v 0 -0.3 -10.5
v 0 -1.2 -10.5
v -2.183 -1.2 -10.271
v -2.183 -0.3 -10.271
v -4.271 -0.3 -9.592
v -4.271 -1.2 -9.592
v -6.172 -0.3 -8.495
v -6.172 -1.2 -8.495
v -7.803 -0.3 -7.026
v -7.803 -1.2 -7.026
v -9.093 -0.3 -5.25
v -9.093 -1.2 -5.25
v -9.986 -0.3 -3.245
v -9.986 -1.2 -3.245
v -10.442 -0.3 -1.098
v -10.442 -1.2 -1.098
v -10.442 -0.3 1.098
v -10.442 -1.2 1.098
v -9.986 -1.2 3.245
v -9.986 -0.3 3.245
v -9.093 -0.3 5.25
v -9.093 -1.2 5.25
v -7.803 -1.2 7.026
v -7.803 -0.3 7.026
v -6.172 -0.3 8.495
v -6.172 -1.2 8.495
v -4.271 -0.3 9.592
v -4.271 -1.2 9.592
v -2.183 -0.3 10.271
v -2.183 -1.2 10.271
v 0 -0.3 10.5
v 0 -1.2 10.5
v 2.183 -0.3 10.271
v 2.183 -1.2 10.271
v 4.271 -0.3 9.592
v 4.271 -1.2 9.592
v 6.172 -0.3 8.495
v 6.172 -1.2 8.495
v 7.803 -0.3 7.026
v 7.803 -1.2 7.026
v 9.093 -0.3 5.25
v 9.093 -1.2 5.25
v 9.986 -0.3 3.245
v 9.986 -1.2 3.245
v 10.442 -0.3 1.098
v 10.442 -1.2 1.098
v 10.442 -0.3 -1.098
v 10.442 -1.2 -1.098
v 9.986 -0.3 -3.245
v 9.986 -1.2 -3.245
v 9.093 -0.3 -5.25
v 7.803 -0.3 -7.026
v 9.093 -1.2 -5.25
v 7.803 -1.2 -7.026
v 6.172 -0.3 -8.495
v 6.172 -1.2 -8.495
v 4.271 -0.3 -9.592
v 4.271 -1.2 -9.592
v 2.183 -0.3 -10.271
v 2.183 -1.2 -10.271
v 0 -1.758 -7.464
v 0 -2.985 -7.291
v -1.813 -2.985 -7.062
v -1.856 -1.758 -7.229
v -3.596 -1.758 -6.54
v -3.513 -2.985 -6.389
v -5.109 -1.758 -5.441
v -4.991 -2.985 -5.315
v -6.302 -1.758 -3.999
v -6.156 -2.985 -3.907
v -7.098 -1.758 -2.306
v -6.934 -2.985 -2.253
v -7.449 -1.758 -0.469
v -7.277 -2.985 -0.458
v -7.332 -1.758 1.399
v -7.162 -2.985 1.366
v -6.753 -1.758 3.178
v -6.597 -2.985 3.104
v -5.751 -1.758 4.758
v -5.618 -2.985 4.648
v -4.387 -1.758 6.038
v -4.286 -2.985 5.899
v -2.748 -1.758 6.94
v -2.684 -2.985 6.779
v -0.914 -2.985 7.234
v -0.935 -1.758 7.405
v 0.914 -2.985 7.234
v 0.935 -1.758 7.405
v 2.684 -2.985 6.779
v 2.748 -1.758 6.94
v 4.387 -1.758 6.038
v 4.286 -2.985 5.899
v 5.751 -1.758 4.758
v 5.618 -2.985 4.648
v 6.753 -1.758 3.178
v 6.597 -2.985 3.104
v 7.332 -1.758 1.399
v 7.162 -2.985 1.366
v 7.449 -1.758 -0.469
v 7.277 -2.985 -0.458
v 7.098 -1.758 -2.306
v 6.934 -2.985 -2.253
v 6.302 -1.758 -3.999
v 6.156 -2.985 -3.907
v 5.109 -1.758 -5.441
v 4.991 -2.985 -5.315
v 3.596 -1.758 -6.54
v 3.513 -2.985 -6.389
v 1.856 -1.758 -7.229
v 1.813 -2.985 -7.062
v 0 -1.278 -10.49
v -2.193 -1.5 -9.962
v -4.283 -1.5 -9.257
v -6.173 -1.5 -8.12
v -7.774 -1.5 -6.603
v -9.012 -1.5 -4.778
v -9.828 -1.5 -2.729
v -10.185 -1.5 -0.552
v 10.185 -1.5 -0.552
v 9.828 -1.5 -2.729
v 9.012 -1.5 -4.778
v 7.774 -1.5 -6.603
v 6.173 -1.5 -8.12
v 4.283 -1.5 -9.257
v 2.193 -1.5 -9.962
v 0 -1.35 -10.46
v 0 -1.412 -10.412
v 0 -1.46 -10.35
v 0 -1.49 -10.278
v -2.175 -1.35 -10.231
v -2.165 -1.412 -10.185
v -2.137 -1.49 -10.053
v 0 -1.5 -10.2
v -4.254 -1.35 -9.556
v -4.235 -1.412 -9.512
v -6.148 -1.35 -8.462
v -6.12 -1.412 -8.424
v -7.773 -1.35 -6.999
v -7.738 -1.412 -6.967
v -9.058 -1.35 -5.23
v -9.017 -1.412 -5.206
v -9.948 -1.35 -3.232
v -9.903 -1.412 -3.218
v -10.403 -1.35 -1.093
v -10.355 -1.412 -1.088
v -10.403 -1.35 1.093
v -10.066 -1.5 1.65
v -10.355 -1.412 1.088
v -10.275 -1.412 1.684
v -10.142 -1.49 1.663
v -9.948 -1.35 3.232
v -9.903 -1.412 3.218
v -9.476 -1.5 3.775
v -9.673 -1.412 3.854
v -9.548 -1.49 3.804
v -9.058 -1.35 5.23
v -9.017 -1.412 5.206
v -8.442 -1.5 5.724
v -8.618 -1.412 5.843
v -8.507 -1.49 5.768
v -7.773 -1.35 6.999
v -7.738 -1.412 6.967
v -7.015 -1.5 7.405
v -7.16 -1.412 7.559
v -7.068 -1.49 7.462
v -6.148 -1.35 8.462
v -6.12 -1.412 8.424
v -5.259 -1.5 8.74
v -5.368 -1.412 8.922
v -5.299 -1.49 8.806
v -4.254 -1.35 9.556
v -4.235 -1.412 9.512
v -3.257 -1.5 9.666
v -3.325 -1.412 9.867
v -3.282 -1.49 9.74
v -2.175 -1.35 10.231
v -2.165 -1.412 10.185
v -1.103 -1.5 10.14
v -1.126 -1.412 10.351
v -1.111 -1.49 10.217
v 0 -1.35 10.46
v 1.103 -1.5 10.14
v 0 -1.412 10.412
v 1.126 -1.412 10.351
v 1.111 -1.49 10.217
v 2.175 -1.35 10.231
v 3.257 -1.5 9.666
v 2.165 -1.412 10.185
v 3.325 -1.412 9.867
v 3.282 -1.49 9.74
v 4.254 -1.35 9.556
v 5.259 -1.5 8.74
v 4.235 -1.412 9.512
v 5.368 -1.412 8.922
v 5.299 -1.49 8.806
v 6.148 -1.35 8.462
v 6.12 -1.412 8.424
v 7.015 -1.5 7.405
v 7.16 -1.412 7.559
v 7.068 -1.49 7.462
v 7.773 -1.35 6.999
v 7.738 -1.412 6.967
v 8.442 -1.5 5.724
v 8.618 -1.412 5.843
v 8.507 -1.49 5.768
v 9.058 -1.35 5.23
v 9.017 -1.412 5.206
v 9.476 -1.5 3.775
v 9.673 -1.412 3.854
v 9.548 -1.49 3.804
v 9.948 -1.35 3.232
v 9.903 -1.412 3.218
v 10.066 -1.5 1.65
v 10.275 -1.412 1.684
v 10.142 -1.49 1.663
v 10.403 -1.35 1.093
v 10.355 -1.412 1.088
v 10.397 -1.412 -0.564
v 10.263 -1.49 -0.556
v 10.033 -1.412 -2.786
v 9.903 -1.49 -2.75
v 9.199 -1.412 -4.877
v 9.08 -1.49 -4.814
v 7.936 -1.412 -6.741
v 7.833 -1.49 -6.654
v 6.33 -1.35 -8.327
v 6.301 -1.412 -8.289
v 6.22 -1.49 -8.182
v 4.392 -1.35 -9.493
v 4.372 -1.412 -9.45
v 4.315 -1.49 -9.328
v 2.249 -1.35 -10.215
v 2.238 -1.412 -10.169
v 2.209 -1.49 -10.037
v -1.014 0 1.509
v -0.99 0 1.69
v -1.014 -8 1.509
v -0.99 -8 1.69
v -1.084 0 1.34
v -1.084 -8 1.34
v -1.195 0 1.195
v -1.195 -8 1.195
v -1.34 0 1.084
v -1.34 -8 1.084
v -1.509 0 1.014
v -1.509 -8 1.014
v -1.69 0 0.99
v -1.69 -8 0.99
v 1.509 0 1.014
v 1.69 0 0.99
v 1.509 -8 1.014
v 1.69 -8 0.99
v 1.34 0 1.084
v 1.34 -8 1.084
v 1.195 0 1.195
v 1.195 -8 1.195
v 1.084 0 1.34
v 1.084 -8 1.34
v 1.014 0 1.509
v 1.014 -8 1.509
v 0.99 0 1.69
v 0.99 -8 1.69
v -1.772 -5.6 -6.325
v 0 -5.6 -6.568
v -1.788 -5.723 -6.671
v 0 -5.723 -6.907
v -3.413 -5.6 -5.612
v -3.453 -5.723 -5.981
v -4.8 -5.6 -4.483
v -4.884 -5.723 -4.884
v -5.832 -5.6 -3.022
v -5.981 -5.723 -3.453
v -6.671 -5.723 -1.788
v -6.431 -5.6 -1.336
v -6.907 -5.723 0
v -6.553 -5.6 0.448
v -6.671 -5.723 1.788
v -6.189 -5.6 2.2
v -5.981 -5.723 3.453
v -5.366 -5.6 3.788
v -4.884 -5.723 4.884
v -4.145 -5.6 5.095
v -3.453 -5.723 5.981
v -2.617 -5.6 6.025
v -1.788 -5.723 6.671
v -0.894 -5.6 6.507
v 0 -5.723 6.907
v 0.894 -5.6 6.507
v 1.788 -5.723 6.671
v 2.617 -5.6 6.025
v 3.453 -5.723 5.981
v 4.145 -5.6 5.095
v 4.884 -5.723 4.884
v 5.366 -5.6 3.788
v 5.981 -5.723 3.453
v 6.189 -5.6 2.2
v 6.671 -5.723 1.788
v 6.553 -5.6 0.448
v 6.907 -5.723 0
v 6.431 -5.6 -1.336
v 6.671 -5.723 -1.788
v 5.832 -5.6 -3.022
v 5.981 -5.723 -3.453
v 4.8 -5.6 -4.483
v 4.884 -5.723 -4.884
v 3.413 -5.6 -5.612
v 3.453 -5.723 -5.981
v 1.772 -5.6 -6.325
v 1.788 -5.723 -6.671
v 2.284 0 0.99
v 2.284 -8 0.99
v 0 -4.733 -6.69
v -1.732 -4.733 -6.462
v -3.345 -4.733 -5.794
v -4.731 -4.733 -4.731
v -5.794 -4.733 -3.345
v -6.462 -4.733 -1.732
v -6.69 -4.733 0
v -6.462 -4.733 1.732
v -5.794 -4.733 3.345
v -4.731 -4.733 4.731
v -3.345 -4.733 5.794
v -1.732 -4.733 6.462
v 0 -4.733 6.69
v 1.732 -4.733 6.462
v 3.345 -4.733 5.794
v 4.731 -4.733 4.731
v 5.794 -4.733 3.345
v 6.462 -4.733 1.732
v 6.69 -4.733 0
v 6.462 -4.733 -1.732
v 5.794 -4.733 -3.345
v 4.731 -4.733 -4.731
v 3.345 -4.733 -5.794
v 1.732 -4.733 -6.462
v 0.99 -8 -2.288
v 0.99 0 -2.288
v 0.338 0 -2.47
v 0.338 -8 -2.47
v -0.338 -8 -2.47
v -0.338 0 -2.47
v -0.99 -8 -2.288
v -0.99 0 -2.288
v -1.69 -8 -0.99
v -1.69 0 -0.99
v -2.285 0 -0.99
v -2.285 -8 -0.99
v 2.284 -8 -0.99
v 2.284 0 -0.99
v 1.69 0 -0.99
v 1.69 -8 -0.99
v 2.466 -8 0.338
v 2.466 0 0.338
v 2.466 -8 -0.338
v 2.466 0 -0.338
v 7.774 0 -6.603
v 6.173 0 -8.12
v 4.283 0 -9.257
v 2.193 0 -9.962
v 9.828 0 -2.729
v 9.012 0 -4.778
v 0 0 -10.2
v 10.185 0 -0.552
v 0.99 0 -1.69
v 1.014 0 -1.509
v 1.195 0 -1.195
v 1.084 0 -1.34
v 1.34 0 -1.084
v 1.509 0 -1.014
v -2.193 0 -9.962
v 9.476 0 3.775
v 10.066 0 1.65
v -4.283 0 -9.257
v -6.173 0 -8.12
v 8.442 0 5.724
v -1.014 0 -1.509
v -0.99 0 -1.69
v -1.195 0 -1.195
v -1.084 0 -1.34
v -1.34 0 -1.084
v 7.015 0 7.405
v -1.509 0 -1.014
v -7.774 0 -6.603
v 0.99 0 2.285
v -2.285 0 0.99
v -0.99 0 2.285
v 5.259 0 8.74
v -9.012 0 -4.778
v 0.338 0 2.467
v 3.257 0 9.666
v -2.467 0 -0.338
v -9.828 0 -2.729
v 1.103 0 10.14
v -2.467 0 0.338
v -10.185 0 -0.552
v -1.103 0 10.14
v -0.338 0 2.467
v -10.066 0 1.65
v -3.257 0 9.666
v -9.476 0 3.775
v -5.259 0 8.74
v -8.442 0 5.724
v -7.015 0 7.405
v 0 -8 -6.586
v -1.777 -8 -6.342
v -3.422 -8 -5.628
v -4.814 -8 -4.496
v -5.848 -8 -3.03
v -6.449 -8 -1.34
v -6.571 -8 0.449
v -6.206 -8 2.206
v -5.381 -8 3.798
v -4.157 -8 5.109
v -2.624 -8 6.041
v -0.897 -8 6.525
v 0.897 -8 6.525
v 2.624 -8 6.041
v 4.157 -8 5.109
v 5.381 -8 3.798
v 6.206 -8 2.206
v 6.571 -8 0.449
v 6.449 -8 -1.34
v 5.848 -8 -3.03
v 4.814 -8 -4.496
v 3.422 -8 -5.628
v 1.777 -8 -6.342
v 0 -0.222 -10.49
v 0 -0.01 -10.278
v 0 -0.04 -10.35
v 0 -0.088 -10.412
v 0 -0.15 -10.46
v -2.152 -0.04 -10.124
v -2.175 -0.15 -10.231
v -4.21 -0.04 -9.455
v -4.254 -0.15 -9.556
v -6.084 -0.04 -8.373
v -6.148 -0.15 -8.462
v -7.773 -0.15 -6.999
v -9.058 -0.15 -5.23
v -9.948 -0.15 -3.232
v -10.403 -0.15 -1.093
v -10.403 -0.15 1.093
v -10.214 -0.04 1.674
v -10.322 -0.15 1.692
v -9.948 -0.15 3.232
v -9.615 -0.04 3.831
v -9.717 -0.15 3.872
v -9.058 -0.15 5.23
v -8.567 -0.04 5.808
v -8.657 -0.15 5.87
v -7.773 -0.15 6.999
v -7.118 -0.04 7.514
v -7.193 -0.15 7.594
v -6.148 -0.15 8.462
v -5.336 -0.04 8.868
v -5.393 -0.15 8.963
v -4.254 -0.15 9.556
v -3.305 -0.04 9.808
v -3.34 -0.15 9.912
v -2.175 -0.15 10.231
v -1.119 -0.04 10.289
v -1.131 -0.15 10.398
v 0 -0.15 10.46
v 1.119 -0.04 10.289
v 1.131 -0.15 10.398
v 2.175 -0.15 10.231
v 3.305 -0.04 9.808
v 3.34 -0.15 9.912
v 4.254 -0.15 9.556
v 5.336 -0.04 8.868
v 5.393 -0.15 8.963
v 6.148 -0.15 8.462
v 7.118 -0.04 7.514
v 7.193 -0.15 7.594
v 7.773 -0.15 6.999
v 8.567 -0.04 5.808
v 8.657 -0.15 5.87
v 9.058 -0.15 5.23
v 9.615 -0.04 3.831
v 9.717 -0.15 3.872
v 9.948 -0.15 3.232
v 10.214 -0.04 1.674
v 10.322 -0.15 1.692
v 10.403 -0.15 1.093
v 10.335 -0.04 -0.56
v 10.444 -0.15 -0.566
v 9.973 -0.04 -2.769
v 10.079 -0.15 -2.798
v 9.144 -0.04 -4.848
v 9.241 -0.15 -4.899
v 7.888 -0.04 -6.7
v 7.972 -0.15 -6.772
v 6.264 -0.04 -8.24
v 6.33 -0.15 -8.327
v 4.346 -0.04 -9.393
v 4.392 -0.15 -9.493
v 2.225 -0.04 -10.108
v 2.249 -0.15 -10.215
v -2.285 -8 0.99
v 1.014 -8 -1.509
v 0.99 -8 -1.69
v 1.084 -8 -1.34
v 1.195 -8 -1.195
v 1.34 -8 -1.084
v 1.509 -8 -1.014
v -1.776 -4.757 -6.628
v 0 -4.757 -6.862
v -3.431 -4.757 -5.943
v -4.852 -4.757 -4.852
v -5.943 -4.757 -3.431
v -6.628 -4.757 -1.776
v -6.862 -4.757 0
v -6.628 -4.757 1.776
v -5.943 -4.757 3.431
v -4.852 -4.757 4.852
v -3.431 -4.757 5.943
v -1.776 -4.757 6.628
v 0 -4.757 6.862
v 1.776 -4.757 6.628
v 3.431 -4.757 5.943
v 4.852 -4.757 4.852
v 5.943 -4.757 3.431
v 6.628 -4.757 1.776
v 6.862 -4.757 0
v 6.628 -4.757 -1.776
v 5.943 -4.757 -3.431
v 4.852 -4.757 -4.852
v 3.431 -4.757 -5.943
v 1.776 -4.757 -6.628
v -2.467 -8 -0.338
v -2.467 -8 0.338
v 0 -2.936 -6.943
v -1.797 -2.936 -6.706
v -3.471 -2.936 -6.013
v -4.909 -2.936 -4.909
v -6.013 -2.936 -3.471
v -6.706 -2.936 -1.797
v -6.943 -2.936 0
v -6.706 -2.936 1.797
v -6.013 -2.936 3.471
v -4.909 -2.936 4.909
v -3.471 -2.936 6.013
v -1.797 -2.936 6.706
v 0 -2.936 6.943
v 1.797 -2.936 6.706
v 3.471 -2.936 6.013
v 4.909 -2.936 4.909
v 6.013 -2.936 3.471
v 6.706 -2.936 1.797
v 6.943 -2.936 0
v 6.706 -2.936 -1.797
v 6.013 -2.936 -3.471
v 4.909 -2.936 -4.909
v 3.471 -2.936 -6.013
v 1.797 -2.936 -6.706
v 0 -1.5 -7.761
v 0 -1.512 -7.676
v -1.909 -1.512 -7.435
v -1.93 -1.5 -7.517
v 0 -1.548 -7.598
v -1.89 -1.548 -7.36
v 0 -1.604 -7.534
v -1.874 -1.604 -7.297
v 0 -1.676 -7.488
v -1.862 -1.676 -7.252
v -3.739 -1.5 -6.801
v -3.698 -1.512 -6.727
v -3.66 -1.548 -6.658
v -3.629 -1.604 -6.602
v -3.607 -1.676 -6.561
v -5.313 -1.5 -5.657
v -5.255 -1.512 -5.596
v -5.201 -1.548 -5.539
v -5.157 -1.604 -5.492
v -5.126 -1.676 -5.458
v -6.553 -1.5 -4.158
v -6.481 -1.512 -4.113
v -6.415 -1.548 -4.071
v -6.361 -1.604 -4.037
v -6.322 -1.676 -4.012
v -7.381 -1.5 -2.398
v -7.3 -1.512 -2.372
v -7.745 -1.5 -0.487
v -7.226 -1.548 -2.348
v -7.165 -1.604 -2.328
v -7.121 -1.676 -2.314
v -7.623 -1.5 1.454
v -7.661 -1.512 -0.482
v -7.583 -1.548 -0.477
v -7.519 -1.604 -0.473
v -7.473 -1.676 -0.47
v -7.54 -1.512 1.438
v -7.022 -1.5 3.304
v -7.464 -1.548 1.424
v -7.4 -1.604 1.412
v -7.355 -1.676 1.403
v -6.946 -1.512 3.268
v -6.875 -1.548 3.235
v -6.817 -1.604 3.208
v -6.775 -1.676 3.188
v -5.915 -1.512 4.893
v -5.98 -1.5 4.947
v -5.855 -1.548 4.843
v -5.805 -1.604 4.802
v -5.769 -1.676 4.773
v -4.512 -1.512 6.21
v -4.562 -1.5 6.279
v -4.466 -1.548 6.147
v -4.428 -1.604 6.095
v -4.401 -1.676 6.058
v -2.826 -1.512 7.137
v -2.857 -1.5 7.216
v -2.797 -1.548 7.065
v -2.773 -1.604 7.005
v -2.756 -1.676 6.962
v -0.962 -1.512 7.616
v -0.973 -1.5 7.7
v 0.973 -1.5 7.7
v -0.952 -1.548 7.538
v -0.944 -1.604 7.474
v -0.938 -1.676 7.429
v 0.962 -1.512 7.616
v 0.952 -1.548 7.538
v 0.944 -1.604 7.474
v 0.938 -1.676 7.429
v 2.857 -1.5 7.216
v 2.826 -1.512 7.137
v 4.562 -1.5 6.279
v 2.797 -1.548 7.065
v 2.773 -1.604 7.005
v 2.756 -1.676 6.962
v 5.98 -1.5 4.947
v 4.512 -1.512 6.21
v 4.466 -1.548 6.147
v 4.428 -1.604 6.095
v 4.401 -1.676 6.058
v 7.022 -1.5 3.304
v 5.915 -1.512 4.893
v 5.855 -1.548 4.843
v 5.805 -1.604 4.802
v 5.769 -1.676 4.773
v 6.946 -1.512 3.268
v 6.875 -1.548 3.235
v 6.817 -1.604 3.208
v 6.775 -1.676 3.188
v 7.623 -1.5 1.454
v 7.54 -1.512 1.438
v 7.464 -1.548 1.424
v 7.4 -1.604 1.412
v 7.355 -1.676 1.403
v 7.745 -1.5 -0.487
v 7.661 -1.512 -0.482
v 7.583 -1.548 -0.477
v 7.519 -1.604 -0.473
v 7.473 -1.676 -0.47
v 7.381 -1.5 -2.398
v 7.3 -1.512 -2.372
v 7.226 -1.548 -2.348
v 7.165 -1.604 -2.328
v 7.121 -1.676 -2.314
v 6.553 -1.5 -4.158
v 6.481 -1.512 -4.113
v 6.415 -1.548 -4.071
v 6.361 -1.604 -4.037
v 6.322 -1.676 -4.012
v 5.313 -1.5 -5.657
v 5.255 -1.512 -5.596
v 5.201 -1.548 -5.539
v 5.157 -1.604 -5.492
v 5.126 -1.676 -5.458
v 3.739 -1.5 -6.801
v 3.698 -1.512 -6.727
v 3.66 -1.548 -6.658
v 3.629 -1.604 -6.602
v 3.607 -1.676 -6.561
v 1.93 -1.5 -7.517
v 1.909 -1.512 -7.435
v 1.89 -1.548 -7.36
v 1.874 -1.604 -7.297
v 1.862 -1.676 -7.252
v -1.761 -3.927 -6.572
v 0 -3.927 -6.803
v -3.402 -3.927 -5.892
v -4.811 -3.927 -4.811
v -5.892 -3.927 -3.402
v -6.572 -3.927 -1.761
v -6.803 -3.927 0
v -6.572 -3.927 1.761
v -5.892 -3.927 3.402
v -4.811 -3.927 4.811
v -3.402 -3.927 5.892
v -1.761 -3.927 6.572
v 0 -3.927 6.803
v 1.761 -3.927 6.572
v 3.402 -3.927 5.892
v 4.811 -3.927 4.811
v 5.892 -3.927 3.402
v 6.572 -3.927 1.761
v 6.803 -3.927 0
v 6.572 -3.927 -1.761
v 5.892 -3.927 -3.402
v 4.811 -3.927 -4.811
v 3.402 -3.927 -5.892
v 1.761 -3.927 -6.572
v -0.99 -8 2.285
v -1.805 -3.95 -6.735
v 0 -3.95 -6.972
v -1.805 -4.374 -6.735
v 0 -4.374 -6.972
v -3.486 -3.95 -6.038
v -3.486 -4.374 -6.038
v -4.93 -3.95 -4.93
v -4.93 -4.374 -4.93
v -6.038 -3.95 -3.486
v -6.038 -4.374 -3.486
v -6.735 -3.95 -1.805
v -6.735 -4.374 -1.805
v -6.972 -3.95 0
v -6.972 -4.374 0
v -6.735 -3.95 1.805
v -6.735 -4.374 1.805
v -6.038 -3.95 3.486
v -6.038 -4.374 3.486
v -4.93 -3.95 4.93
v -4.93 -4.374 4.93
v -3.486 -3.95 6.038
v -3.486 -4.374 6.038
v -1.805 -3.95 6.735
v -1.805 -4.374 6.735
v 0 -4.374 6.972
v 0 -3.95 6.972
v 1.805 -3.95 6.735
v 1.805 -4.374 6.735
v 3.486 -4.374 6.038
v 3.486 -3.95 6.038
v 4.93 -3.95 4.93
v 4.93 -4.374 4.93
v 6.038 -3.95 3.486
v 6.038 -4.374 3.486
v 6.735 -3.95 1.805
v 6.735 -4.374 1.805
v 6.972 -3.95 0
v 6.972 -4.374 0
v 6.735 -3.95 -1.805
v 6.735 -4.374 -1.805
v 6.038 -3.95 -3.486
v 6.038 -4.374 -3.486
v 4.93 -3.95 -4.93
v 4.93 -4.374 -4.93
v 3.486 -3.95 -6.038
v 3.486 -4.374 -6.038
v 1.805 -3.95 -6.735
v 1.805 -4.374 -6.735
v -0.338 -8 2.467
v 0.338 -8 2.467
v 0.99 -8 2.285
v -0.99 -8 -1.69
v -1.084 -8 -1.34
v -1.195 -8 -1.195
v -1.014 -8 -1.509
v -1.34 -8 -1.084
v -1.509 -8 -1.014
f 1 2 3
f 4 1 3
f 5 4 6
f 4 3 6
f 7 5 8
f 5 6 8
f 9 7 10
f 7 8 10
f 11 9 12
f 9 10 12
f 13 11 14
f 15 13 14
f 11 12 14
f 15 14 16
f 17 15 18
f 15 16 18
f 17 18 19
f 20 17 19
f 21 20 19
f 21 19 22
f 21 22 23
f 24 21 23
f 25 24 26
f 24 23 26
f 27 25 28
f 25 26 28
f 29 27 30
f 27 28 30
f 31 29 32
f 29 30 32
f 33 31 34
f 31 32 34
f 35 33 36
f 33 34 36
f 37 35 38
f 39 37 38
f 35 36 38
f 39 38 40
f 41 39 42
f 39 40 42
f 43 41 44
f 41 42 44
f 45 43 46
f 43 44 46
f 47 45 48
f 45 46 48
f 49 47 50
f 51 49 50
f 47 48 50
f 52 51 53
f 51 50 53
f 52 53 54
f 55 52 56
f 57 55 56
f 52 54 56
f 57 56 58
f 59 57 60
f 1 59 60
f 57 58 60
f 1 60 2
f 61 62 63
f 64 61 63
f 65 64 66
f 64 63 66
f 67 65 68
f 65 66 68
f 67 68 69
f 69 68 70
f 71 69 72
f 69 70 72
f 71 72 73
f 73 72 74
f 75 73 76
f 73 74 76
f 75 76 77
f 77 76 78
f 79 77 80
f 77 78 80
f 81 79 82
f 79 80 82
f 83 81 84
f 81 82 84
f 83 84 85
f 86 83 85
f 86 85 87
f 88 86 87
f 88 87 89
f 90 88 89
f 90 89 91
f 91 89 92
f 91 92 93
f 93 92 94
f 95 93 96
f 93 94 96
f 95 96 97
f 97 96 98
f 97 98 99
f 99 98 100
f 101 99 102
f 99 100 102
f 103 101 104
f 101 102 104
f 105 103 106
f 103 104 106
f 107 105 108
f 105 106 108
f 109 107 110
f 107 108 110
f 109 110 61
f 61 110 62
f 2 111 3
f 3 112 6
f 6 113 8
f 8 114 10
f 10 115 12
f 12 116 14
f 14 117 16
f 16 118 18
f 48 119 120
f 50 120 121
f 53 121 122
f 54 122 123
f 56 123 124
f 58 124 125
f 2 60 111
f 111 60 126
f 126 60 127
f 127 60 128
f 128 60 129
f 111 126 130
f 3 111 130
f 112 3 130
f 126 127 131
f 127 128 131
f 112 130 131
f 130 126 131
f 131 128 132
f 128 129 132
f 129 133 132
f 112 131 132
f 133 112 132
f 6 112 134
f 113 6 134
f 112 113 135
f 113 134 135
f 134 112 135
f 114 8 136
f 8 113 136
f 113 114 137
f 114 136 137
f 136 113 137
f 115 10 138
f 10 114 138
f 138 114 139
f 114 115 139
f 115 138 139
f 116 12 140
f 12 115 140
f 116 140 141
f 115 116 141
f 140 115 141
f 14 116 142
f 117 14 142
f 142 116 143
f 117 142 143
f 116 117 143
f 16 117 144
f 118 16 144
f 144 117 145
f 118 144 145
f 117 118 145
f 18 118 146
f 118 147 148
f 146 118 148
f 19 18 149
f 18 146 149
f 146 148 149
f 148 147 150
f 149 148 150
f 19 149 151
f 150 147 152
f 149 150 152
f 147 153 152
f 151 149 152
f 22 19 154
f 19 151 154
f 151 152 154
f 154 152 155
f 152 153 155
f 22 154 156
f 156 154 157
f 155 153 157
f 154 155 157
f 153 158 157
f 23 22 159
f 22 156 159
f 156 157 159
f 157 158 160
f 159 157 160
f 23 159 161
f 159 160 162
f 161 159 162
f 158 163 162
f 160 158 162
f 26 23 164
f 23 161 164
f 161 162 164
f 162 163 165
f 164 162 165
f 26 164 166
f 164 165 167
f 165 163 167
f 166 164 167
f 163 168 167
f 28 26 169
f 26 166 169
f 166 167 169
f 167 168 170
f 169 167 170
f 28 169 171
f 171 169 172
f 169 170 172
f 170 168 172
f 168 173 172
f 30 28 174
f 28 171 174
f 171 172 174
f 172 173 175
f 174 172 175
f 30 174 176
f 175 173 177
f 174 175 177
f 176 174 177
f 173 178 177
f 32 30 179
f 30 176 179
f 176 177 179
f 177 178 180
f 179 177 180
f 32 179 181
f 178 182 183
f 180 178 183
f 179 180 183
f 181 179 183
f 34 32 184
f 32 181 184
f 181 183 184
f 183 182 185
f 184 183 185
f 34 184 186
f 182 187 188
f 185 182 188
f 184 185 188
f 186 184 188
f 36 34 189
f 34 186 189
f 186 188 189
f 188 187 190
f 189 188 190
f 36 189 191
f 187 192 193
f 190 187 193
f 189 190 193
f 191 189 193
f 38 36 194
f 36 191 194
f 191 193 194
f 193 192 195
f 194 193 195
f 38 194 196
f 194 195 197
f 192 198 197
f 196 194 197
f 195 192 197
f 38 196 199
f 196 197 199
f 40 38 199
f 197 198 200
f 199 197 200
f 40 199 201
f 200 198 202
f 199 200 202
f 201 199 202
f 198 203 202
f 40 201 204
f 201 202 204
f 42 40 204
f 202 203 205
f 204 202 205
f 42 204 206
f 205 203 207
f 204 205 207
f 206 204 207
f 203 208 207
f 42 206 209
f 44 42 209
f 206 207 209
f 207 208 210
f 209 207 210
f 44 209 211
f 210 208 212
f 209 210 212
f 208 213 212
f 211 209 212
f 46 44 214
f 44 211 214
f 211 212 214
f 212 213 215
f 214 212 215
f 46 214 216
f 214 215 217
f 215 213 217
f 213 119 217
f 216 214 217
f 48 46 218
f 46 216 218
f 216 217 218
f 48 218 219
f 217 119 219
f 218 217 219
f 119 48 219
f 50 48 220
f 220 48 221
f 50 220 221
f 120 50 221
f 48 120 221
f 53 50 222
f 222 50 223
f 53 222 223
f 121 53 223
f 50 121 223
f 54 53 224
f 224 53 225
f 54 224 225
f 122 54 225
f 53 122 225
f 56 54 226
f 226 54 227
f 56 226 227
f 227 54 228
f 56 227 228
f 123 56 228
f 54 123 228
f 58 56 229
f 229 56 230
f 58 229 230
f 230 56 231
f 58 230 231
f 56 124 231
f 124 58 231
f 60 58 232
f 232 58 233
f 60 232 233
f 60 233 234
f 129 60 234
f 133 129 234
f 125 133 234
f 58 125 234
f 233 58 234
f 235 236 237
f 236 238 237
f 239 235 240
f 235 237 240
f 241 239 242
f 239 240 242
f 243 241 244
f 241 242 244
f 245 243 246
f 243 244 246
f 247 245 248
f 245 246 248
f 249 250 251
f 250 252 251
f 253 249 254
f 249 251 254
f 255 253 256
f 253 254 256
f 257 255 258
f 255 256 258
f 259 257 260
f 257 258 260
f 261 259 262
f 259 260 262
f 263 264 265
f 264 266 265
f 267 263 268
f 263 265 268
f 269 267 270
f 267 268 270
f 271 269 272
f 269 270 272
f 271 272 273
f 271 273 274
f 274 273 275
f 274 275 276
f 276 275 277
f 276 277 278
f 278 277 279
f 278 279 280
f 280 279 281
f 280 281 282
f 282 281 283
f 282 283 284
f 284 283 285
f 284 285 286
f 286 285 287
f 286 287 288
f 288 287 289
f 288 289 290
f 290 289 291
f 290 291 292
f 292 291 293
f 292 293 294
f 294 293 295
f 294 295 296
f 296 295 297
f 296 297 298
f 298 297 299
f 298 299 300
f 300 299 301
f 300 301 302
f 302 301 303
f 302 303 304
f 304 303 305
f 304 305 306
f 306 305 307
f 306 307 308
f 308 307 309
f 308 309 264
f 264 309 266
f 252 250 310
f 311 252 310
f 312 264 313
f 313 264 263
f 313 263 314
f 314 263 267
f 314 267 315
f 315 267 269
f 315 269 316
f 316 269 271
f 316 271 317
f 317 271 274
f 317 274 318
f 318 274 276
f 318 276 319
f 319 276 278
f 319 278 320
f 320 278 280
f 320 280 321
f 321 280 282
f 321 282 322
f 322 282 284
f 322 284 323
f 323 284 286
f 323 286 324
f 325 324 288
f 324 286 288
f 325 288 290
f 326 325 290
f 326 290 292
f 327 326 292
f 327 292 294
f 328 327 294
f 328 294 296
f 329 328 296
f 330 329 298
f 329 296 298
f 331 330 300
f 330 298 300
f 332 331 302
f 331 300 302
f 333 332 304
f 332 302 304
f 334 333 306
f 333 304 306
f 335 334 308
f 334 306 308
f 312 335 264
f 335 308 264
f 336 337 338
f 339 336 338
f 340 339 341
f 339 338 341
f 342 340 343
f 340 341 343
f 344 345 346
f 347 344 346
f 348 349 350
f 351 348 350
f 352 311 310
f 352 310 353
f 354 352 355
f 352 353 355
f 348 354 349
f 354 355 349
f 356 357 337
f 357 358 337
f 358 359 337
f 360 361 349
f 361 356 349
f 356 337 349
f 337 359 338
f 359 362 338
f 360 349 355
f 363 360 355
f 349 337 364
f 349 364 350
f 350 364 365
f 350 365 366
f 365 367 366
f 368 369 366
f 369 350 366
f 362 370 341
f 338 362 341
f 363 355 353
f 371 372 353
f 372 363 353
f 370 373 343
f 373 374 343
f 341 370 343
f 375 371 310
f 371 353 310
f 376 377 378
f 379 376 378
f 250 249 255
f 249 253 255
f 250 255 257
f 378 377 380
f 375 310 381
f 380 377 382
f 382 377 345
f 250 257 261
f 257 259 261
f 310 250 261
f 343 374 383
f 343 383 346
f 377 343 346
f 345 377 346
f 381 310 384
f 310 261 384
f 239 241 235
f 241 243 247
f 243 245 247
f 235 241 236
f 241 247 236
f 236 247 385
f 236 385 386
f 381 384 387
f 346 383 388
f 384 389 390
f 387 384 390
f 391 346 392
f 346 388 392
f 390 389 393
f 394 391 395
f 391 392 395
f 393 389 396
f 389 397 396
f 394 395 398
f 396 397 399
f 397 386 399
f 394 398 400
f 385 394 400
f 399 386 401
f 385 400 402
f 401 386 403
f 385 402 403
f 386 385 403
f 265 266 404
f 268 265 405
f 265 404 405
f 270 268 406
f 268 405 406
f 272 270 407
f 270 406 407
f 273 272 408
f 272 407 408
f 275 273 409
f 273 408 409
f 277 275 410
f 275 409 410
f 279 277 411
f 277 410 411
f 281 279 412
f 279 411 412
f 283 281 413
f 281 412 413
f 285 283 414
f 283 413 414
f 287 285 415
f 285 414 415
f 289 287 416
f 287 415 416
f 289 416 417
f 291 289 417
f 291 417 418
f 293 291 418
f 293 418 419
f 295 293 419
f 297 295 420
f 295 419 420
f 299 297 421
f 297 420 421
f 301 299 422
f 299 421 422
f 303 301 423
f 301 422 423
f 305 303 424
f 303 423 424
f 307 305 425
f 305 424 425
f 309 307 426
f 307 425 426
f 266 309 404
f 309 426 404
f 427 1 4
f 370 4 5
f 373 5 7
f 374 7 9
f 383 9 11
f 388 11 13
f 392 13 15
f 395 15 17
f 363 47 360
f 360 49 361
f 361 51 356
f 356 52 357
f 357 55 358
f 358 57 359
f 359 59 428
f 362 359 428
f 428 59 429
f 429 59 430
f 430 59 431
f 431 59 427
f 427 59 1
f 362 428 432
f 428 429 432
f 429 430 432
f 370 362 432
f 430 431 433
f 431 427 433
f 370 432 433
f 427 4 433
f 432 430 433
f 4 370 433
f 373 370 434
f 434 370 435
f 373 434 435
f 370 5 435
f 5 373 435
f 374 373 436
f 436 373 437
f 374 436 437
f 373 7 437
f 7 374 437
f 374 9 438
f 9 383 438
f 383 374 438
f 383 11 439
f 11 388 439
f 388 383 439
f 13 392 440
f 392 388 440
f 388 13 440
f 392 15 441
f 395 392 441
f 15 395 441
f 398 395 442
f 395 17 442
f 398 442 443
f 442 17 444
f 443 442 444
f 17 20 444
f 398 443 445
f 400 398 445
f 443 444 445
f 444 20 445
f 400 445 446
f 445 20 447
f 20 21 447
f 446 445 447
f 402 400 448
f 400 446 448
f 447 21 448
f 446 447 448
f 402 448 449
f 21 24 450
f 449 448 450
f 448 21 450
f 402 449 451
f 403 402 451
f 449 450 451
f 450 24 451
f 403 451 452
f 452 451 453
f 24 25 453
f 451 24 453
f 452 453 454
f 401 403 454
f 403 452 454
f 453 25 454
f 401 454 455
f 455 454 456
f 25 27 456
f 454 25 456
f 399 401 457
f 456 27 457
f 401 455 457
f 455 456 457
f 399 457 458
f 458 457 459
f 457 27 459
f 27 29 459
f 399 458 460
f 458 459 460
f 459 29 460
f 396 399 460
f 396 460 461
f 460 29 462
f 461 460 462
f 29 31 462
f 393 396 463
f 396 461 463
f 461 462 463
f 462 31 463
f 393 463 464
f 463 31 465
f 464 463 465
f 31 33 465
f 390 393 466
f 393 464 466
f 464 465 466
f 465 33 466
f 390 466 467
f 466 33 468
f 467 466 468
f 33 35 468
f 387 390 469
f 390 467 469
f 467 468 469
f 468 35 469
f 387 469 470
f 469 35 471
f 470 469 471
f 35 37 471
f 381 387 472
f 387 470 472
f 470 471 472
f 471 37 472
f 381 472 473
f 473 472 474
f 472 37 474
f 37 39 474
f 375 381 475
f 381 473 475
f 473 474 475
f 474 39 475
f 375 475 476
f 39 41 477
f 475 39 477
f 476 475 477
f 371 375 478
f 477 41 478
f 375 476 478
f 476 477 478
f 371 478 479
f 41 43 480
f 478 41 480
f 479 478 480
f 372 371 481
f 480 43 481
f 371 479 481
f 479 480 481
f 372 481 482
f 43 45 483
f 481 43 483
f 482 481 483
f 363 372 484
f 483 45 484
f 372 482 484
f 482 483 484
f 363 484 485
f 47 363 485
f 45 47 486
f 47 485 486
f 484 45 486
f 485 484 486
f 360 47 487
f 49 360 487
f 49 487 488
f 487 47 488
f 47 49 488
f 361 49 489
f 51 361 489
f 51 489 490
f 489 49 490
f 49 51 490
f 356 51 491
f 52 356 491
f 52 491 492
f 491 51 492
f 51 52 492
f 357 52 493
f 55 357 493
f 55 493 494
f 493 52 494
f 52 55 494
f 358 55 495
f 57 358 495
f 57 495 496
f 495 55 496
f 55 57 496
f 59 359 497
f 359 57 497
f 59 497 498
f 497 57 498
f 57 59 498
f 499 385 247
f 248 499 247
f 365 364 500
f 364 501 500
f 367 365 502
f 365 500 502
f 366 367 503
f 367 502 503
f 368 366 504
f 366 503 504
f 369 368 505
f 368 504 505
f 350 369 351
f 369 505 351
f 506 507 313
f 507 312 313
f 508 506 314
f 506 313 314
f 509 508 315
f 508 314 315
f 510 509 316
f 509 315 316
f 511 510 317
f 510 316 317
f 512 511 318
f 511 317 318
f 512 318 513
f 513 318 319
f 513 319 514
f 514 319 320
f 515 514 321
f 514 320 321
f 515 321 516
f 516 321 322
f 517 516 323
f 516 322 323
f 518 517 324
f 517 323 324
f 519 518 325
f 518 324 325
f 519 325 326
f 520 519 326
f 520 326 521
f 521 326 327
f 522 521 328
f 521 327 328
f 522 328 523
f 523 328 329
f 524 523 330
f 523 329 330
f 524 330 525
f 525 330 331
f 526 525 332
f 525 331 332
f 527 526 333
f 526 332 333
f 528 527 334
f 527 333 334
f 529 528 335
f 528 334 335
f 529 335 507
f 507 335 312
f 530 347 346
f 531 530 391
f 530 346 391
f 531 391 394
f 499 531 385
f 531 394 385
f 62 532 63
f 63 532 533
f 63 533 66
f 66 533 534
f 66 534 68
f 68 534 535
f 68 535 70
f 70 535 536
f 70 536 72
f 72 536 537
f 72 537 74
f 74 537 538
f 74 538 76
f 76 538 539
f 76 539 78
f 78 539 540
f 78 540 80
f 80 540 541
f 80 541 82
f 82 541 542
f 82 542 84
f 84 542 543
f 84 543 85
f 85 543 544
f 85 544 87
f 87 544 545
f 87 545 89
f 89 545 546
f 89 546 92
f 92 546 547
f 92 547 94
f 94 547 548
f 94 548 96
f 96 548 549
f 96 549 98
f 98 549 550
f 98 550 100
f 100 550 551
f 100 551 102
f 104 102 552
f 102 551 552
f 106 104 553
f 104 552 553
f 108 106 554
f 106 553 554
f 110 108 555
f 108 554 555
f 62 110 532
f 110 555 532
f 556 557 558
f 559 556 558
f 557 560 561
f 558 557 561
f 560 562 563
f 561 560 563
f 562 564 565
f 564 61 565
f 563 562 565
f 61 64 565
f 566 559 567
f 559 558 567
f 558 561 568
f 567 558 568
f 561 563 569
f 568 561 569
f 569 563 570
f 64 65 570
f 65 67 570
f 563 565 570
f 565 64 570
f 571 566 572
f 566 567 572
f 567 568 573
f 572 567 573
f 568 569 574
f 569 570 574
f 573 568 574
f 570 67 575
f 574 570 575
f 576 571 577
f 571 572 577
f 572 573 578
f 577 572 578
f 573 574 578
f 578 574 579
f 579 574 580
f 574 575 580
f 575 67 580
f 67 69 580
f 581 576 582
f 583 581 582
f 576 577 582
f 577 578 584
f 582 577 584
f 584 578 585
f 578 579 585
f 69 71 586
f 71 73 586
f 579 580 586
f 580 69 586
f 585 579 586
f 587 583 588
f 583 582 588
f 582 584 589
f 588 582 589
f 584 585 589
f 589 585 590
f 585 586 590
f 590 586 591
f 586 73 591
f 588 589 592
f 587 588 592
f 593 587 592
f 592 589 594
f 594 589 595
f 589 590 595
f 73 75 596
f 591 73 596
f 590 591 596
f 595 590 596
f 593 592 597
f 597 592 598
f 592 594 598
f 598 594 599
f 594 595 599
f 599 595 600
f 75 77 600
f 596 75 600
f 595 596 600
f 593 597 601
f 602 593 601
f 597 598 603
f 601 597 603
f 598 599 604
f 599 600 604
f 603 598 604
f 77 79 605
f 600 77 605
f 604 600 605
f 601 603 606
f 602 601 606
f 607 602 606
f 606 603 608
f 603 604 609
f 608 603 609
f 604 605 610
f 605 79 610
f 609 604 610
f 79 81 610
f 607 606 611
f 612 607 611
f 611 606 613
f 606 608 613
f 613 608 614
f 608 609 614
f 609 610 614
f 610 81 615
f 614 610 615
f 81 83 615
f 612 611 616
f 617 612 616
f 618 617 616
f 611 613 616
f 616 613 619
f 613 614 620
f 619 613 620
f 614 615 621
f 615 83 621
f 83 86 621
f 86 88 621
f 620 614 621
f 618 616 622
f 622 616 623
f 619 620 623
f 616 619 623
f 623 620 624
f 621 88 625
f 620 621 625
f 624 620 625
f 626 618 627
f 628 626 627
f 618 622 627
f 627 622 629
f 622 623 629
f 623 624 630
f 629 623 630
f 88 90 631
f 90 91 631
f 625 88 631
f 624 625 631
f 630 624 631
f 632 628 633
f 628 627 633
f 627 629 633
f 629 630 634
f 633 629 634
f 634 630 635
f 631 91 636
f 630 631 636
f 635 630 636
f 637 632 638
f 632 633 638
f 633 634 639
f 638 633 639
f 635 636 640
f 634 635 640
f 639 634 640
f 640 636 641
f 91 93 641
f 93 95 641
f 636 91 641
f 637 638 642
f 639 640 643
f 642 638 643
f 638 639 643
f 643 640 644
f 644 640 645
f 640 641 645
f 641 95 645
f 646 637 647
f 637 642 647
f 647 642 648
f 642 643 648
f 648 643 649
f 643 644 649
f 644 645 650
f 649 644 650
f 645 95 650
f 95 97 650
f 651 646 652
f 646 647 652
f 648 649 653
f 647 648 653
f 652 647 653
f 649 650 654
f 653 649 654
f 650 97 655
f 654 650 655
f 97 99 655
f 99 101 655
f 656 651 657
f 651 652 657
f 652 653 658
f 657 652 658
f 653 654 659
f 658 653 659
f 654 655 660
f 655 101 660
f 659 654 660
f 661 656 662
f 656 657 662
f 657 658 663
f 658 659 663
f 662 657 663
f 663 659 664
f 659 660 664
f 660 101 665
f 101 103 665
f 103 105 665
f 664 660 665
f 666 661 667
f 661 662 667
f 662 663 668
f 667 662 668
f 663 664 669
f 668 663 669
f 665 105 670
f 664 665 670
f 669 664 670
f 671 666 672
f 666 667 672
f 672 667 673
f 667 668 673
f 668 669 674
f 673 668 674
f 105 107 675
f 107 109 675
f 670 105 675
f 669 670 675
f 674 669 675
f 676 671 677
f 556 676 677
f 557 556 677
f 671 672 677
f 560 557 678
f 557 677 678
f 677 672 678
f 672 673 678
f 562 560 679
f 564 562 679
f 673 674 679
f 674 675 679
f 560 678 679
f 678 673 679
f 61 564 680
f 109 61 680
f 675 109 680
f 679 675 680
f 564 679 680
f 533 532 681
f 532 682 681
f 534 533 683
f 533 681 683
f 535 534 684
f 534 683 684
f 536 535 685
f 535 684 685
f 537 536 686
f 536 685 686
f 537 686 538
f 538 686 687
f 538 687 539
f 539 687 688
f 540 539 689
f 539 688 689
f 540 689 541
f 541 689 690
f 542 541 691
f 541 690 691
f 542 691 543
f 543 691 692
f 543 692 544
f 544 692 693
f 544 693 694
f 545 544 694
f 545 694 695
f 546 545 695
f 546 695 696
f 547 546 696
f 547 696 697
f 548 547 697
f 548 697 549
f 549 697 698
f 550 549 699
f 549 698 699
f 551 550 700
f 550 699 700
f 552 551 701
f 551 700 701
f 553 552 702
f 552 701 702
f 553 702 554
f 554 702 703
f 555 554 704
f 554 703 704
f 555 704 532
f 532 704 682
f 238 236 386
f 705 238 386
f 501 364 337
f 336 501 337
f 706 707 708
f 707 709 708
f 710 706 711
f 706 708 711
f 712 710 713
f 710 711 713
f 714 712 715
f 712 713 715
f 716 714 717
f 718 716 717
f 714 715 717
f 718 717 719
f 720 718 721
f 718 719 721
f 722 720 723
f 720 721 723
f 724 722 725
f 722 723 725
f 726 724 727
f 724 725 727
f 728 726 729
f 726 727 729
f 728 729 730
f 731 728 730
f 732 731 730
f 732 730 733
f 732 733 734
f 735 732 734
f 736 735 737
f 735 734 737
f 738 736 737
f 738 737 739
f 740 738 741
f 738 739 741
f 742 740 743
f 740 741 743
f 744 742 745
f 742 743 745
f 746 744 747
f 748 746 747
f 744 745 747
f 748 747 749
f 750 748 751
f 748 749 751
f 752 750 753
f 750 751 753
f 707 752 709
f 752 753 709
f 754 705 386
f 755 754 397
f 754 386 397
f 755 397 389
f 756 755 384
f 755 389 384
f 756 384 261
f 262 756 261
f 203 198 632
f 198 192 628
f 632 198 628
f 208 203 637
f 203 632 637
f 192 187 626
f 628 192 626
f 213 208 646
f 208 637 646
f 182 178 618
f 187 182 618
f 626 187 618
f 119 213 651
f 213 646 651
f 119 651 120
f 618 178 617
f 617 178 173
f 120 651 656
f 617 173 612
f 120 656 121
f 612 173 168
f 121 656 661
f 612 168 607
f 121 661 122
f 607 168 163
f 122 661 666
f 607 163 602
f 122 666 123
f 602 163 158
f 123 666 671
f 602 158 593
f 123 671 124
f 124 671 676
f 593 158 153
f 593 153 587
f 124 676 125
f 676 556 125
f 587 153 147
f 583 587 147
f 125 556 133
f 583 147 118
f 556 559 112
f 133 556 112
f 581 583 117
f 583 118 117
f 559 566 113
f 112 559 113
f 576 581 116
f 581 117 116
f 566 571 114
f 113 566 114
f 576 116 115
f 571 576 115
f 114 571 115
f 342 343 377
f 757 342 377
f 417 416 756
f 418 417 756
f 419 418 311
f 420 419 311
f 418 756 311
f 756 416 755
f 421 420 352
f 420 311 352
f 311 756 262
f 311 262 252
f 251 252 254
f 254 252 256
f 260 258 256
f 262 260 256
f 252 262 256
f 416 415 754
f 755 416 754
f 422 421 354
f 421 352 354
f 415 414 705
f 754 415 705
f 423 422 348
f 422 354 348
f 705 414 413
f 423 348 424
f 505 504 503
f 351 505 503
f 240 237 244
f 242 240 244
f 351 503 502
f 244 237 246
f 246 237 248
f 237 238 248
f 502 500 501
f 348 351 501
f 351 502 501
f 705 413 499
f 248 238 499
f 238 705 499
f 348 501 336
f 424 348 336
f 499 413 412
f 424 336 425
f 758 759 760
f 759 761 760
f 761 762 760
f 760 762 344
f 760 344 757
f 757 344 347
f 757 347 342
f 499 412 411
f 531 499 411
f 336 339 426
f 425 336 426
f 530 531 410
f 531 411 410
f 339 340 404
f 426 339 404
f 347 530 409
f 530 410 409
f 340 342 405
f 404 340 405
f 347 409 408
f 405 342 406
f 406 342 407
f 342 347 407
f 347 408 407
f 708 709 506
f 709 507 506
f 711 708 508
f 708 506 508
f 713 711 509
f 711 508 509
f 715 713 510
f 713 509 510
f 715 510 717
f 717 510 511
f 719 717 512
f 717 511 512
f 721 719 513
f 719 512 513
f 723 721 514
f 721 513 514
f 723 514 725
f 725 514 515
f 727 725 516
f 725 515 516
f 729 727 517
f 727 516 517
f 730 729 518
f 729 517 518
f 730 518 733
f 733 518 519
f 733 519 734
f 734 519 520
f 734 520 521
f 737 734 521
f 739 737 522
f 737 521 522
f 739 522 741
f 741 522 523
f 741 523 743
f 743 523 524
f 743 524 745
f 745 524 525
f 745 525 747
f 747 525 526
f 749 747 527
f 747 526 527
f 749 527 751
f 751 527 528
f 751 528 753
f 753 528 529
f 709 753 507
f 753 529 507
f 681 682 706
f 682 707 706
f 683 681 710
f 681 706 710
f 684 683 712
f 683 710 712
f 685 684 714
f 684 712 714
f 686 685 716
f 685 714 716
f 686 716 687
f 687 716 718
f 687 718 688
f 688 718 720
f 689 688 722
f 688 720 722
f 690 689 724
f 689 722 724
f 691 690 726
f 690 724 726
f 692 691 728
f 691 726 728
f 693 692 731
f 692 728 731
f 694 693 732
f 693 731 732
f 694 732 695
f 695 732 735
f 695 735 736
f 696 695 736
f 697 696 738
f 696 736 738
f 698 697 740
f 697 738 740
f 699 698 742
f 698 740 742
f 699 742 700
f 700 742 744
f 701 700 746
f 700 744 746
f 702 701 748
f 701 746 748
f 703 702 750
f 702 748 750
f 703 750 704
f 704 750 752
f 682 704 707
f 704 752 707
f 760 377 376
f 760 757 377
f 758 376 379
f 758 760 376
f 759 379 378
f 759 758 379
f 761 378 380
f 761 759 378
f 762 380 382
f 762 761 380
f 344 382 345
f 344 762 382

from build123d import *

# Parameters (mm, degrees)
CUT_EXTRUDE1_DEPTH = 17.867127793
FILLET1_R          = 0.7
FILLET2_R          = 0.3


with BuildPart() as part:
    # Sketch2 → Revolve1 (revolve)
    with BuildSketch(Plane.XY, mode=Mode.PRIVATE) as revolve1_sk:
        Polygon((0, 0), (10.5, 0), (10.5, -1.5), (7.5, -1.5), (7.291240349, -2.985402103), (6.942652064, -2.936411215), (6.803478963, -3.926679283), (6.972213603, -3.950393391), (6.972213603, -4.374297025), (6.861946509, -4.75677404), (6.690208868, -4.732637888), (6.568289136, -5.600141858), (6.906531053, -5.722750977), (6.586484574, -8), (0, -8), align=None)
    revolve(revolve1_sk.sketch.rotate(Axis((0, 0, 0), (0, 1, 0)), 90), axis=Axis((0, 0, 0), (0, 1, 0)))

    # Sketch1 → Cut-Extrude1 (cut, through all)
    with BuildSketch(Plane(origin=(0, 0, 0), x_dir=(1, 0, 0), z_dir=(0, 1, 0))):
        with BuildLine():
            Line((-0.99, 0.99), (-2.284731932, 0.99))
            ThreePointArc((-2.284731932, 0.99), (-2.49, 0), (-2.284731932, -0.99))
            Line((-2.284731932, -0.99), (-0.99, -0.99))
            Line((-0.99, -0.99), (-0.99, -2.284731932))
            ThreePointArc((-0.99, -2.284731932), (0, -2.49), (0.99, -2.284731932))
            Line((0.99, -2.284731932), (0.99, -0.99))
            Line((0.99, -0.99), (2.284249826, -0.99))
            ThreePointArc((2.284249826, -0.99), (2.489557645, 0), (2.284249826, 0.99))
            Line((2.284249826, 0.99), (0.99, 0.99))
            Line((0.99, 0.99), (0.99, 2.28753254))
            ThreePointArc((0.99, 2.28753254), (0, 2.492569984), (-0.99, 2.28753254))
            Line((-0.99, 2.28753254), (-0.99, 0.99))
        make_face()
    extrude(amount=-CUT_EXTRUDE1_DEPTH, mode=Mode.SUBTRACT)

    # Fillet1
    fillet1_edges = [part.edges().sort_by_distance(p)[0] for p in [
        (-0.99, -4, -0.99),
        (0.99, -4, -0.99),
        (0.99, -4, 0.99),
        (-0.99, -4, 0.99),
    ]]
    fillet(fillet1_edges, radius=FILLET1_R)

    # Fillet2
    fillet2_edges = [part.edges().sort_by_distance(p)[0] for p in [
        (0, -1.5, 7.5),
        (0, -1.5, 10.5),
        (0, 0, 10.5),
    ]]
    fillet(fillet2_edges, radius=FILLET2_R)


solid = part.part
